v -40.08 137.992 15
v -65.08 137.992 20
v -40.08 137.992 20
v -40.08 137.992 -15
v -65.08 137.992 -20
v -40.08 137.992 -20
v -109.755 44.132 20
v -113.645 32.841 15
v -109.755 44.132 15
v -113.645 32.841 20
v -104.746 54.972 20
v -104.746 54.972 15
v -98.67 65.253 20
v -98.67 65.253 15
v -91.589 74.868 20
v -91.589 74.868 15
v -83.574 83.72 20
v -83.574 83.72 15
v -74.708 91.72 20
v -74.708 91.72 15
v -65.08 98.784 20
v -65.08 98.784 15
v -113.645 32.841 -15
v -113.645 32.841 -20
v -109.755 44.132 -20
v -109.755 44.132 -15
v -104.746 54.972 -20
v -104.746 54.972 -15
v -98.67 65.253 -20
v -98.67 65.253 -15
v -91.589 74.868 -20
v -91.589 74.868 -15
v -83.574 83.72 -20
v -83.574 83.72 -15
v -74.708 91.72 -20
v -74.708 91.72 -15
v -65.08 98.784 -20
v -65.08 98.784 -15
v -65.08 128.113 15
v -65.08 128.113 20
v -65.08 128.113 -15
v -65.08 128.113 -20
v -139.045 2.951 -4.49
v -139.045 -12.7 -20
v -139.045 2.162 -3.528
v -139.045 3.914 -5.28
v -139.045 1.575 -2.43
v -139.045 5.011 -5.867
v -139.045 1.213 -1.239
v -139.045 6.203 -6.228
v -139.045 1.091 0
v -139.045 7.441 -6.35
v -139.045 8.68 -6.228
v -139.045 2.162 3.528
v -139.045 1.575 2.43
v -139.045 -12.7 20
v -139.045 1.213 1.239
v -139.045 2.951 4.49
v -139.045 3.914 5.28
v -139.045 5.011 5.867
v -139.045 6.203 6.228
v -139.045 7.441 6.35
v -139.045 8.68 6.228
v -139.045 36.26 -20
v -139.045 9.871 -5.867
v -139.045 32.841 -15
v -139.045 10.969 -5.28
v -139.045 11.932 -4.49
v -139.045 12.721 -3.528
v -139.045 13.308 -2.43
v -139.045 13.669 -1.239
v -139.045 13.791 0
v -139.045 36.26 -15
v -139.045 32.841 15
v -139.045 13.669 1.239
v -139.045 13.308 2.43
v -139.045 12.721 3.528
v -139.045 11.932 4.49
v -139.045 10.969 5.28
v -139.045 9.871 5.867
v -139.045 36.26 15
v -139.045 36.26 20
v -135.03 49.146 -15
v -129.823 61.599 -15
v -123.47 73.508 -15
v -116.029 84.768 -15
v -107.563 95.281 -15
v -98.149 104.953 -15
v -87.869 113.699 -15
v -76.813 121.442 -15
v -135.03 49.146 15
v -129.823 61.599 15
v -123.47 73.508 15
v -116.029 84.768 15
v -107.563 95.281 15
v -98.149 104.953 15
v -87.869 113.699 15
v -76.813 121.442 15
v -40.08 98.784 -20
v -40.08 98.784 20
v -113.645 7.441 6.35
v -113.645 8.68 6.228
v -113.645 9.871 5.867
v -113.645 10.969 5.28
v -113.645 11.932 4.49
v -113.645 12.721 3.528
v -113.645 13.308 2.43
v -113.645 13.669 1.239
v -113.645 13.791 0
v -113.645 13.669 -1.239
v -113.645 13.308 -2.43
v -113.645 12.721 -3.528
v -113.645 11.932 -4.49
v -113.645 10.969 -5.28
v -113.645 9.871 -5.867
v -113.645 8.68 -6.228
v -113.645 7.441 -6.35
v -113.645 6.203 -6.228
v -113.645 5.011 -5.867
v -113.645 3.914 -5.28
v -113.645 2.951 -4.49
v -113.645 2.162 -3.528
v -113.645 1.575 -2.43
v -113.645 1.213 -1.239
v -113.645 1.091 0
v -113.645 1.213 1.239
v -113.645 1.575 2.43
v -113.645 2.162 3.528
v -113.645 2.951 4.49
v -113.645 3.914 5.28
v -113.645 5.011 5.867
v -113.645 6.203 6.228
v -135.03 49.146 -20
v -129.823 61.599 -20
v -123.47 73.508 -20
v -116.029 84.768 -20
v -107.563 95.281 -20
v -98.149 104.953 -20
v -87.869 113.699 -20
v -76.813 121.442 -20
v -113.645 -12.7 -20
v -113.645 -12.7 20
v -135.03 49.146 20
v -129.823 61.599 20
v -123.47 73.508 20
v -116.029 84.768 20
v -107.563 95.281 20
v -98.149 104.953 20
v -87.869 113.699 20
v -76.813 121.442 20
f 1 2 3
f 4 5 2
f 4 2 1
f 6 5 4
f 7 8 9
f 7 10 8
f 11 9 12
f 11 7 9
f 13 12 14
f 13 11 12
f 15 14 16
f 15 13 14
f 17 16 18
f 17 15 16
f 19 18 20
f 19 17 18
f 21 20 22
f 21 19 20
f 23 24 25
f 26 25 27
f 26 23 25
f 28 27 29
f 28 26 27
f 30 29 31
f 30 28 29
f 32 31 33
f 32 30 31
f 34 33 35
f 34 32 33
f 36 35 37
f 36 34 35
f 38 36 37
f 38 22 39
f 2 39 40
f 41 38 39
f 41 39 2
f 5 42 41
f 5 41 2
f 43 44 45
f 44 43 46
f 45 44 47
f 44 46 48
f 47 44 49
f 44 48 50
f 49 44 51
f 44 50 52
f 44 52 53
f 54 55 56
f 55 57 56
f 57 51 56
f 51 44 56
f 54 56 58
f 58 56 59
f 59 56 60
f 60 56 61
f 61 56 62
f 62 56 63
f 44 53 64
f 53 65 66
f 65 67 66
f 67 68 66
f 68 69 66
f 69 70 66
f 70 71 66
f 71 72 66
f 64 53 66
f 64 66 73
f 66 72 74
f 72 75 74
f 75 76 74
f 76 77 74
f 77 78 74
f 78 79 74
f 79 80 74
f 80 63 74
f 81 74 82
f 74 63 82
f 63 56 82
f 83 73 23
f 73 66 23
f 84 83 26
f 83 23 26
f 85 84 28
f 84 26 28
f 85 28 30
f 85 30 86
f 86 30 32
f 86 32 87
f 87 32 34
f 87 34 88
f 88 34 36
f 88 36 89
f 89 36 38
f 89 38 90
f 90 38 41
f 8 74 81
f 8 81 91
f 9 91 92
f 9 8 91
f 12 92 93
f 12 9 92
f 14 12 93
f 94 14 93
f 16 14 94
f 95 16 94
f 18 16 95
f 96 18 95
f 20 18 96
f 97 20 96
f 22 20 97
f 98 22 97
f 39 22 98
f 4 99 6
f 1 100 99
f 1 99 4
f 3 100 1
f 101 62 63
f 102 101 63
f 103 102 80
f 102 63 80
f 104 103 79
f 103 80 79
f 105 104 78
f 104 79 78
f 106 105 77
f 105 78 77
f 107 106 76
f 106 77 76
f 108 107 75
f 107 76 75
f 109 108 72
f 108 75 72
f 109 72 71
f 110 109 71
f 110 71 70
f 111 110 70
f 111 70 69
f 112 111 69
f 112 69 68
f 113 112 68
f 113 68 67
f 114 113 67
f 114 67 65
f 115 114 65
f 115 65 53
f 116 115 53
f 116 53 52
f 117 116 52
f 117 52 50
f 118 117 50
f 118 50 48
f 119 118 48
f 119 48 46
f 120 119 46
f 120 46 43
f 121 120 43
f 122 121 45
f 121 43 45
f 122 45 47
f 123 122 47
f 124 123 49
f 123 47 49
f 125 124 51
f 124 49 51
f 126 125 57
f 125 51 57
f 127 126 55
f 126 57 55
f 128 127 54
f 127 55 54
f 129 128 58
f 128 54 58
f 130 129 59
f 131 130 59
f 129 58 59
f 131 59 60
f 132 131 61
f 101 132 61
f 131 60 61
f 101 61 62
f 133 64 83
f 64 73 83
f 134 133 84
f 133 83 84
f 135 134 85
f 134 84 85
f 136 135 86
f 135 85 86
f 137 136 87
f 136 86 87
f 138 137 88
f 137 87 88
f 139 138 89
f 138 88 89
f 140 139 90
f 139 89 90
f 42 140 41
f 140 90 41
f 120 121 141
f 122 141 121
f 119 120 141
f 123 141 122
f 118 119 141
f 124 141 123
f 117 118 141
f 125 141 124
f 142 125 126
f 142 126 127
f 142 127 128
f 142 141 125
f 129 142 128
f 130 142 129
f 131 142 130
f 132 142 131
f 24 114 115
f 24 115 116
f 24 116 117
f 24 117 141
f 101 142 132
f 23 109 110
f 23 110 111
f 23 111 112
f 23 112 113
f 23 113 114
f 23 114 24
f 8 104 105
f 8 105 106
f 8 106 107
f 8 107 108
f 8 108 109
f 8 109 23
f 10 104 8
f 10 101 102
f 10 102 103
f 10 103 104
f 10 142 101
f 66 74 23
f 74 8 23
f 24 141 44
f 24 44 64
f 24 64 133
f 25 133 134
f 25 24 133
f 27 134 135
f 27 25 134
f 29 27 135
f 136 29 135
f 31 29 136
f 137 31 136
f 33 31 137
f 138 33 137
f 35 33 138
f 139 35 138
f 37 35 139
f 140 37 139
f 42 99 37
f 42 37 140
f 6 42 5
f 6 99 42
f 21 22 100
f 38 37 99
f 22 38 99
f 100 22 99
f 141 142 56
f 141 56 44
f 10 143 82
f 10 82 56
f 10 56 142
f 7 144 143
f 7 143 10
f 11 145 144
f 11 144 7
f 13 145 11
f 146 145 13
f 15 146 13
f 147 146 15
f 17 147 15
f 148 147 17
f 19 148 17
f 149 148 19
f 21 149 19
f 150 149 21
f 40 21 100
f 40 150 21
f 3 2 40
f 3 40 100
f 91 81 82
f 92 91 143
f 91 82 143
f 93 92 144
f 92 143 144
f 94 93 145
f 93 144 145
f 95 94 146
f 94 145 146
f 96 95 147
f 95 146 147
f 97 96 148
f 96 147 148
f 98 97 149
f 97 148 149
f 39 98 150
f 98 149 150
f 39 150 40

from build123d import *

# Parameters (mm, degrees)
SKETCH3_W                = 40
SKETCH3_H                = 45.541401669
BOSS_EXTRUDE2_DEPTH      = 300
BOSS_EXTRUDE2_DEPTH_BACK = 300
BOSS_EXTRUDE1_DEPTH      = 20
BOSS_EXTRUDE1_DEPTH_BACK = 20
CUT_EXTRUDE1_DEPTH       = 21
CUT_EXTRUDE1_DEPTH_BACK  = 21
SKETCH6_R                = 6.35
CUT_EXTRUDE3_DEPTH       = 464.230235913
SKETCH7_W                = 30
SKETCH7_H                = 500
CUT_EXTRUDE4_DEPTH       = 301
SKETCH9_W                = 717.699329224
SKETCH9_H                = 847.048890614
CUT_EXTRUDE6_DEPTH       = 21
CUT_EXTRUDE6_DEPTH_BACK  = 21
BOSS_EXTRUDE4_START      = -20
SKETCH11_W               = 25
SKETCH11_H               = 39.2080494
BOSS_EXTRUDE4_DEPTH      = 40
SKETCH15_W               = 300
SKETCH15_H               = 135
CUT_EXTRUDE9_DEPTH       = 21
CUT_EXTRUDE9_DEPTH_BACK  = 21


with BuildPart() as part:
    # Sketch3 → Boss-Extrude2 (new body, two sides)
    with BuildSketch(Plane(origin=(0, 0, 0), x_dir=(0, 0, -1), z_dir=(1, 0, 0))) as boss_extrude2_sk:
        with Locations((0, 10.070700834)):
            Rectangle(SKETCH3_W, SKETCH3_H)
    extrude(amount=BOSS_EXTRUDE2_DEPTH)
    extrude(boss_extrude2_sk.sketch, amount=-BOSS_EXTRUDE2_DEPTH_BACK)

    # Sketch2 → Boss-Extrude1 (add, two sides)
    with BuildSketch(Plane.XY) as boss_extrude1_sk:
        with BuildLine():
            Line((105.595237536, 0), (-143.695237536, 0))
            ThreePointArc((-143.695237536, 0), (0, 143.695237536), (143.695237536, 0))
            Line((143.695237536, 0), (105.595237536, 0))
        make_face()
    extrude(amount=BOSS_EXTRUDE1_DEPTH)
    extrude(boss_extrude1_sk.sketch, amount=-BOSS_EXTRUDE1_DEPTH_BACK)

    # Sketch4 → Cut-Extrude1 (cut, two sides)
    with BuildSketch(Plane.XY) as cut_extrude1_sk:
        with BuildLine():
            Line((113.645085948, 32.841401669), (113.645085948, -47.609700579))
            Line((113.645085948, -47.609700579), (-113.645085948, -47.609700579))
            Line((-113.645085948, -47.609700579), (-113.645085948, 32.841401669))
            ThreePointArc((-113.645085948, 32.841401669), (0, 118.295237536), (113.645085948, 32.841401669))
        make_face()
    extrude(amount=CUT_EXTRUDE1_DEPTH, mode=Mode.SUBTRACT)
    extrude(cut_extrude1_sk.sketch, amount=-CUT_EXTRUDE1_DEPTH_BACK, mode=Mode.SUBTRACT)

    # Sketch6 → Cut-Extrude3 (cut, through all)
    with BuildSketch(Plane.ZY.offset(163.230235913)):
        with Locations((0, 7.441401669)):
            Circle(SKETCH6_R)
    extrude(amount=-CUT_EXTRUDE3_DEPTH, mode=Mode.SUBTRACT)

    # Sketch7 → Cut-Extrude4 (cut, through all)
    with BuildSketch(Plane(origin=(0, 0, 0), x_dir=(0, 0, -1), z_dir=(1, 0, 0))):
        with Locations((0, 282.841401669)):
            Rectangle(SKETCH7_W, SKETCH7_H)
    extrude(amount=-CUT_EXTRUDE4_DEPTH, mode=Mode.SUBTRACT)

    # Sketch9 → Cut-Extrude6 (cut, two sides)
    with BuildSketch(Plane.XY) as cut_extrude6_sk:
        with Locations((318.769664612, 189.175554693)):
            Rectangle(SKETCH9_W, SKETCH9_H)
    extrude(amount=CUT_EXTRUDE6_DEPTH, mode=Mode.SUBTRACT)
    extrude(cut_extrude6_sk.sketch, amount=-CUT_EXTRUDE6_DEPTH_BACK, mode=Mode.SUBTRACT)

    # Sketch11 → Boss-Extrude4 (add)
    with BuildSketch(Plane.XY.offset(BOSS_EXTRUDE4_START)):
        with Locations((-52.58, 118.388420349)):
            Rectangle(SKETCH11_W, SKETCH11_H)
    extrude(amount=BOSS_EXTRUDE4_DEPTH)

    # Sketch15 → Cut-Extrude9 (cut, two sides)
    with BuildSketch(Plane.XY) as cut_extrude9_sk:
        with Locations((-289.045085948, 35.220701391)):
            Rectangle(SKETCH15_W, SKETCH15_H)
    extrude(amount=CUT_EXTRUDE9_DEPTH, mode=Mode.SUBTRACT)
    extrude(cut_extrude9_sk.sketch, amount=-CUT_EXTRUDE9_DEPTH_BACK, mode=Mode.SUBTRACT)


solid = part.part
